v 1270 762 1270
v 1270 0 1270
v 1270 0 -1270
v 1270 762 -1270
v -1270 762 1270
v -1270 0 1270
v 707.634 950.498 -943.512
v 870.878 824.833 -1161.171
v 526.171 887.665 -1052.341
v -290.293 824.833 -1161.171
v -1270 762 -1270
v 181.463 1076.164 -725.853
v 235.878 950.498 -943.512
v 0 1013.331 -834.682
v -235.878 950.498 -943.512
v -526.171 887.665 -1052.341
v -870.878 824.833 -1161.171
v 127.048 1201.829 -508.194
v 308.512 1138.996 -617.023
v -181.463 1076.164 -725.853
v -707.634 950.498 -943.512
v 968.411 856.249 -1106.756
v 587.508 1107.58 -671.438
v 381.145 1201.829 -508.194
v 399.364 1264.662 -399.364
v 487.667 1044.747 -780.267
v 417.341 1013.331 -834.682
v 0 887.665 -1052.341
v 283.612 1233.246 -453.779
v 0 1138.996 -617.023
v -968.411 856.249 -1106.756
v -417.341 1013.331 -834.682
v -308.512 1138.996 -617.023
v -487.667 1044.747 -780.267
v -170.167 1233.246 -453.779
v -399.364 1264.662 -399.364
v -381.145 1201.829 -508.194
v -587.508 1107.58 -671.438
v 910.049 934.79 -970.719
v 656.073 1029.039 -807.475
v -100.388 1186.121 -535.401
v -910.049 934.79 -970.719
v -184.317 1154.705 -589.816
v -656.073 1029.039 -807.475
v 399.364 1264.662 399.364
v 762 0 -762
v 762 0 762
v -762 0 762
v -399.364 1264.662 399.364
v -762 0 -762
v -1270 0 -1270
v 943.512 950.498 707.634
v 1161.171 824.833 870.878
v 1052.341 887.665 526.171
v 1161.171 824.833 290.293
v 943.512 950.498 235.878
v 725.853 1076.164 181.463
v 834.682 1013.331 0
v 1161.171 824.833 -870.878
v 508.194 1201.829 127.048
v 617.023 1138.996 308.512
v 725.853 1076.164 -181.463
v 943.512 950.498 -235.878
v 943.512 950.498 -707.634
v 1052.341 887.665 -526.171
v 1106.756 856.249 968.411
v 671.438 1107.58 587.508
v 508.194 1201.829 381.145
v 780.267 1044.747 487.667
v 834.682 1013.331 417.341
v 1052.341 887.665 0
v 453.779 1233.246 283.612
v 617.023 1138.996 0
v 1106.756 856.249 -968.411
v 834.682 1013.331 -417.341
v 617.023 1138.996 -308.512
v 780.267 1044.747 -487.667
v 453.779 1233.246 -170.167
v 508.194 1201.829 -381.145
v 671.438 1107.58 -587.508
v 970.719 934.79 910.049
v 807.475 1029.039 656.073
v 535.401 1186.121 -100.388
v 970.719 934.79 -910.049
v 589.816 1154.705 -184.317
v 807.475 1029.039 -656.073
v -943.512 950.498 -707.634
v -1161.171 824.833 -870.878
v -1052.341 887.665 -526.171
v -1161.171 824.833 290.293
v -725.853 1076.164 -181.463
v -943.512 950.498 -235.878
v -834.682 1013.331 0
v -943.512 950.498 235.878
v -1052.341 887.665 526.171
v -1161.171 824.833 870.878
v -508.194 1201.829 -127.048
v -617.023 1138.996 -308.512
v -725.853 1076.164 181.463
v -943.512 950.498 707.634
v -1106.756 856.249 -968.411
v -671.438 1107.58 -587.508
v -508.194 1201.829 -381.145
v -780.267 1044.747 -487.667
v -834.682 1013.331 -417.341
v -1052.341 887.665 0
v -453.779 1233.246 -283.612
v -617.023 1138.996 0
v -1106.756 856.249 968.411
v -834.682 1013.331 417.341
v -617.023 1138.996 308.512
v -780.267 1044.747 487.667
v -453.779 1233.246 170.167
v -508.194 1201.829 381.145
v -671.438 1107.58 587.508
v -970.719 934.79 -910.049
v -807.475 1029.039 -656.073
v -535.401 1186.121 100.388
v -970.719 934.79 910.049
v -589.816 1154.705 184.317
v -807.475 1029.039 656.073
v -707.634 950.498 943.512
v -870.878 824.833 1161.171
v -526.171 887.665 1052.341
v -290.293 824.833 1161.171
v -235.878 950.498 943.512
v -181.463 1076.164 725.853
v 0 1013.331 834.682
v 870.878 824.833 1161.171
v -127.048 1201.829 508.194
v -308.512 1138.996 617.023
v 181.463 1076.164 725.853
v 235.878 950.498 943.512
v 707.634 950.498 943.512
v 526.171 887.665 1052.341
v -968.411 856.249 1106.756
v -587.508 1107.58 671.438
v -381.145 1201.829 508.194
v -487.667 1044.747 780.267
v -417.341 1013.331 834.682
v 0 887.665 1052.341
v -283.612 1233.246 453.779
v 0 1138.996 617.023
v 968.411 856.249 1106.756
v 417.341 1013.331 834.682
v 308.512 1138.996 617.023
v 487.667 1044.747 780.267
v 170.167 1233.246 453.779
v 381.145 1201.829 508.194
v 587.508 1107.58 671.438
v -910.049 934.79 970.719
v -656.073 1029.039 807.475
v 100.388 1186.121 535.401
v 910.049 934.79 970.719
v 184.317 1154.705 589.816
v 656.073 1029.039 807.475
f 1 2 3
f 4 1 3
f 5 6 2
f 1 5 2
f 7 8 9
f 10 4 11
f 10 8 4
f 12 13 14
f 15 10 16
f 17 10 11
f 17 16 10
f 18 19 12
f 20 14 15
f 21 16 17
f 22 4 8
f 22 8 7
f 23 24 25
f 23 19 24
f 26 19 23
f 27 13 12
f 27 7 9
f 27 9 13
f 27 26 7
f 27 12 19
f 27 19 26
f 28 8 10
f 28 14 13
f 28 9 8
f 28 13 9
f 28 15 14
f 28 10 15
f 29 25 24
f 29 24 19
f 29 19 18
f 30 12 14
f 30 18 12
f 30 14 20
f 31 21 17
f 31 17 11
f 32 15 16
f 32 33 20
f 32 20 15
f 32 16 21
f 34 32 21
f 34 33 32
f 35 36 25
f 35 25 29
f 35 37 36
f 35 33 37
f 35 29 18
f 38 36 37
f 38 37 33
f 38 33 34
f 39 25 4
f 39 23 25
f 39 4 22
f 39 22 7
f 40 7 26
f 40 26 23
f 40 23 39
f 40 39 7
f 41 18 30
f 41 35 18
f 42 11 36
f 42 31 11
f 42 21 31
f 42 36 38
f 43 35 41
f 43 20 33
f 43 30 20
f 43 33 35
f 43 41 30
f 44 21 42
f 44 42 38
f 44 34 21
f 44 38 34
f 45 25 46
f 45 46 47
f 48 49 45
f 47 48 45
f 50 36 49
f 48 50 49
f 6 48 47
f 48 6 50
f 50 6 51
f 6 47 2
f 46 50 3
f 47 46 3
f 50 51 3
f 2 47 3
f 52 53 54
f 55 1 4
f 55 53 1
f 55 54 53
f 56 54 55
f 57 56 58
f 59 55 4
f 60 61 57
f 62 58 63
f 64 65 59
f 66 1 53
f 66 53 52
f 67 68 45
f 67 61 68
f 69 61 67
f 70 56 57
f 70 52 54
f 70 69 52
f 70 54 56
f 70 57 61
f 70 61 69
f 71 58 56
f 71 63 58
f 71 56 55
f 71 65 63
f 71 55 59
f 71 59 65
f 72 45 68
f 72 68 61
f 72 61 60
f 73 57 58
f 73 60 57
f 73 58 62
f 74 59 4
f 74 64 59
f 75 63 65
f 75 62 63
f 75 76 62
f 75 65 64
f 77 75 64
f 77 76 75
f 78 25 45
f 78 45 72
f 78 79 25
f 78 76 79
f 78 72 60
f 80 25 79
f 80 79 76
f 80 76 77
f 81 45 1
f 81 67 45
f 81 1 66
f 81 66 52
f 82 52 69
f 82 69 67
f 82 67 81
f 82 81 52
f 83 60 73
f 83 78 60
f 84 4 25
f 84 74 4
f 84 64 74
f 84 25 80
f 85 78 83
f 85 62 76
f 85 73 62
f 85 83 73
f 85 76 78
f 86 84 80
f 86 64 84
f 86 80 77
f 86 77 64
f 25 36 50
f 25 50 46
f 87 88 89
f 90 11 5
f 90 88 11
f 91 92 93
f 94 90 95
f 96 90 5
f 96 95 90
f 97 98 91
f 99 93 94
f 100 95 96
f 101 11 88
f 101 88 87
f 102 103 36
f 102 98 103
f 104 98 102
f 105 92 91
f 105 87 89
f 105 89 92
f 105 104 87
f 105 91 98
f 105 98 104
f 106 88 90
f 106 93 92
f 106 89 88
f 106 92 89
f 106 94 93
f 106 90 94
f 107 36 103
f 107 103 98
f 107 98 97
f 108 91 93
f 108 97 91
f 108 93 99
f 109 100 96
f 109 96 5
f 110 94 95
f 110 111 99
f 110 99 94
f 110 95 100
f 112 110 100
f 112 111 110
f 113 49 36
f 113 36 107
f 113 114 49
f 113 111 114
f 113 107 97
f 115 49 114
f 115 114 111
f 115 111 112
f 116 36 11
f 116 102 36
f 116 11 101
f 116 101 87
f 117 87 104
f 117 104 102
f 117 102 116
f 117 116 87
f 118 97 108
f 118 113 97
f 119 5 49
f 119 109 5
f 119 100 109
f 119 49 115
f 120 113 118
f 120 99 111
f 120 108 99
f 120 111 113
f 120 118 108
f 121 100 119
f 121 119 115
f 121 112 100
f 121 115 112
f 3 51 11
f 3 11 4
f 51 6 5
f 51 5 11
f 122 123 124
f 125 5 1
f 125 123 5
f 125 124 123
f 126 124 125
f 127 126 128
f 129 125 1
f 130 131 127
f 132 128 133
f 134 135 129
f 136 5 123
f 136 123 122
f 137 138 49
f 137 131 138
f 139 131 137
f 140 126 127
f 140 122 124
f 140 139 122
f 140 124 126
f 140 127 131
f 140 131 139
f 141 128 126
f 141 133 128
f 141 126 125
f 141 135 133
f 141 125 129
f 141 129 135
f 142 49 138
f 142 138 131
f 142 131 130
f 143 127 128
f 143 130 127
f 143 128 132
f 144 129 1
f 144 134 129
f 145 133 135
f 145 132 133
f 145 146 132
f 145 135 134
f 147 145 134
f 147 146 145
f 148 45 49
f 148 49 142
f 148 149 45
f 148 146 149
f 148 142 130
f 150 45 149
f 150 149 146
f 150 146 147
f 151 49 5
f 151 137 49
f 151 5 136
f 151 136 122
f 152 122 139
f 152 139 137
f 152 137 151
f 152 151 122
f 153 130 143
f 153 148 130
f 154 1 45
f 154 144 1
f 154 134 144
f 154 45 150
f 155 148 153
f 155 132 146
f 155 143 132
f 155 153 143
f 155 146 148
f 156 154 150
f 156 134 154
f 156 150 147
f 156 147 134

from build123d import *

# Parameters (mm, degrees)
SKETCH1_W           = 2540
SKETCH1_H           = 2540
BOSS_EXTRUDE1_DEPTH = 762
SKETCH2_W           = 762
SKETCH2_H           = 762
BOSS_EXTRUDE2_DEPTH = 508
SKETCH4_W           = 2540
SKETCH4_H           = 2540
BOSS_EXTRUDE3_DEPTH = 508
BOSS_EXTRUDE3_TAPER = 60
SKETCH5_W           = 1524
SKETCH5_H           = 1524
CUT_EXTRUDE1_DEPTH  = 1270
CUT_EXTRUDE1_DRAFT  = -16


with BuildPart() as part:
    # Sketch1 → Boss-Extrude1 (new body)
    with BuildSketch(Plane(origin=(0, 0, 0), x_dir=(1, 0, 0), z_dir=(0, 1, 0))):
        Rectangle(SKETCH1_W, SKETCH1_H)
    extrude(amount=BOSS_EXTRUDE1_DEPTH)

    # Sketch2 → Boss-Extrude2 (add)
    with BuildSketch(Plane(origin=(0, 762, 0), x_dir=(1, 0, 0), z_dir=(0, 1, 0))):
        Rectangle(SKETCH2_W, SKETCH2_H)
    extrude(amount=BOSS_EXTRUDE2_DEPTH)

    # Sketch4 → Boss-Extrude3 (add)
    with BuildSketch(Plane(origin=(0, 762, 0), x_dir=(1, 0, 0), z_dir=(0, 1, 0))):
        Rectangle(SKETCH4_W, SKETCH4_H)
    extrude(amount=BOSS_EXTRUDE3_DEPTH, taper=BOSS_EXTRUDE3_TAPER)


with BuildPart() as cut_extrude1_tool:
    # Sketch5 → Cut-Extrude1 (with draft: the straight prism first)
    with BuildSketch(Plane.XZ):
        Rectangle(SKETCH5_W, SKETCH5_H)
    extrude(amount=-CUT_EXTRUDE1_DEPTH)
    # Cut-Extrude1: the draft: its side faces are tilted about the plane it starts from
    cut_extrude1_sides = [cut_extrude1_tool.faces().sort_by_distance(p)[0] for p in [
        (762, 635, 0),
        (0, 635, 762),
        (-762, 635, 0),
        (0, 635, -762),
    ]]
    draft(cut_extrude1_sides, Plane.XZ, CUT_EXTRUDE1_DRAFT)


with BuildPart() as part_1:
    add(part.part)

    # Cut-Extrude1: cut by cut_extrude1_tool
    add(cut_extrude1_tool.part, mode=Mode.SUBTRACT)


solid = part_1.part
